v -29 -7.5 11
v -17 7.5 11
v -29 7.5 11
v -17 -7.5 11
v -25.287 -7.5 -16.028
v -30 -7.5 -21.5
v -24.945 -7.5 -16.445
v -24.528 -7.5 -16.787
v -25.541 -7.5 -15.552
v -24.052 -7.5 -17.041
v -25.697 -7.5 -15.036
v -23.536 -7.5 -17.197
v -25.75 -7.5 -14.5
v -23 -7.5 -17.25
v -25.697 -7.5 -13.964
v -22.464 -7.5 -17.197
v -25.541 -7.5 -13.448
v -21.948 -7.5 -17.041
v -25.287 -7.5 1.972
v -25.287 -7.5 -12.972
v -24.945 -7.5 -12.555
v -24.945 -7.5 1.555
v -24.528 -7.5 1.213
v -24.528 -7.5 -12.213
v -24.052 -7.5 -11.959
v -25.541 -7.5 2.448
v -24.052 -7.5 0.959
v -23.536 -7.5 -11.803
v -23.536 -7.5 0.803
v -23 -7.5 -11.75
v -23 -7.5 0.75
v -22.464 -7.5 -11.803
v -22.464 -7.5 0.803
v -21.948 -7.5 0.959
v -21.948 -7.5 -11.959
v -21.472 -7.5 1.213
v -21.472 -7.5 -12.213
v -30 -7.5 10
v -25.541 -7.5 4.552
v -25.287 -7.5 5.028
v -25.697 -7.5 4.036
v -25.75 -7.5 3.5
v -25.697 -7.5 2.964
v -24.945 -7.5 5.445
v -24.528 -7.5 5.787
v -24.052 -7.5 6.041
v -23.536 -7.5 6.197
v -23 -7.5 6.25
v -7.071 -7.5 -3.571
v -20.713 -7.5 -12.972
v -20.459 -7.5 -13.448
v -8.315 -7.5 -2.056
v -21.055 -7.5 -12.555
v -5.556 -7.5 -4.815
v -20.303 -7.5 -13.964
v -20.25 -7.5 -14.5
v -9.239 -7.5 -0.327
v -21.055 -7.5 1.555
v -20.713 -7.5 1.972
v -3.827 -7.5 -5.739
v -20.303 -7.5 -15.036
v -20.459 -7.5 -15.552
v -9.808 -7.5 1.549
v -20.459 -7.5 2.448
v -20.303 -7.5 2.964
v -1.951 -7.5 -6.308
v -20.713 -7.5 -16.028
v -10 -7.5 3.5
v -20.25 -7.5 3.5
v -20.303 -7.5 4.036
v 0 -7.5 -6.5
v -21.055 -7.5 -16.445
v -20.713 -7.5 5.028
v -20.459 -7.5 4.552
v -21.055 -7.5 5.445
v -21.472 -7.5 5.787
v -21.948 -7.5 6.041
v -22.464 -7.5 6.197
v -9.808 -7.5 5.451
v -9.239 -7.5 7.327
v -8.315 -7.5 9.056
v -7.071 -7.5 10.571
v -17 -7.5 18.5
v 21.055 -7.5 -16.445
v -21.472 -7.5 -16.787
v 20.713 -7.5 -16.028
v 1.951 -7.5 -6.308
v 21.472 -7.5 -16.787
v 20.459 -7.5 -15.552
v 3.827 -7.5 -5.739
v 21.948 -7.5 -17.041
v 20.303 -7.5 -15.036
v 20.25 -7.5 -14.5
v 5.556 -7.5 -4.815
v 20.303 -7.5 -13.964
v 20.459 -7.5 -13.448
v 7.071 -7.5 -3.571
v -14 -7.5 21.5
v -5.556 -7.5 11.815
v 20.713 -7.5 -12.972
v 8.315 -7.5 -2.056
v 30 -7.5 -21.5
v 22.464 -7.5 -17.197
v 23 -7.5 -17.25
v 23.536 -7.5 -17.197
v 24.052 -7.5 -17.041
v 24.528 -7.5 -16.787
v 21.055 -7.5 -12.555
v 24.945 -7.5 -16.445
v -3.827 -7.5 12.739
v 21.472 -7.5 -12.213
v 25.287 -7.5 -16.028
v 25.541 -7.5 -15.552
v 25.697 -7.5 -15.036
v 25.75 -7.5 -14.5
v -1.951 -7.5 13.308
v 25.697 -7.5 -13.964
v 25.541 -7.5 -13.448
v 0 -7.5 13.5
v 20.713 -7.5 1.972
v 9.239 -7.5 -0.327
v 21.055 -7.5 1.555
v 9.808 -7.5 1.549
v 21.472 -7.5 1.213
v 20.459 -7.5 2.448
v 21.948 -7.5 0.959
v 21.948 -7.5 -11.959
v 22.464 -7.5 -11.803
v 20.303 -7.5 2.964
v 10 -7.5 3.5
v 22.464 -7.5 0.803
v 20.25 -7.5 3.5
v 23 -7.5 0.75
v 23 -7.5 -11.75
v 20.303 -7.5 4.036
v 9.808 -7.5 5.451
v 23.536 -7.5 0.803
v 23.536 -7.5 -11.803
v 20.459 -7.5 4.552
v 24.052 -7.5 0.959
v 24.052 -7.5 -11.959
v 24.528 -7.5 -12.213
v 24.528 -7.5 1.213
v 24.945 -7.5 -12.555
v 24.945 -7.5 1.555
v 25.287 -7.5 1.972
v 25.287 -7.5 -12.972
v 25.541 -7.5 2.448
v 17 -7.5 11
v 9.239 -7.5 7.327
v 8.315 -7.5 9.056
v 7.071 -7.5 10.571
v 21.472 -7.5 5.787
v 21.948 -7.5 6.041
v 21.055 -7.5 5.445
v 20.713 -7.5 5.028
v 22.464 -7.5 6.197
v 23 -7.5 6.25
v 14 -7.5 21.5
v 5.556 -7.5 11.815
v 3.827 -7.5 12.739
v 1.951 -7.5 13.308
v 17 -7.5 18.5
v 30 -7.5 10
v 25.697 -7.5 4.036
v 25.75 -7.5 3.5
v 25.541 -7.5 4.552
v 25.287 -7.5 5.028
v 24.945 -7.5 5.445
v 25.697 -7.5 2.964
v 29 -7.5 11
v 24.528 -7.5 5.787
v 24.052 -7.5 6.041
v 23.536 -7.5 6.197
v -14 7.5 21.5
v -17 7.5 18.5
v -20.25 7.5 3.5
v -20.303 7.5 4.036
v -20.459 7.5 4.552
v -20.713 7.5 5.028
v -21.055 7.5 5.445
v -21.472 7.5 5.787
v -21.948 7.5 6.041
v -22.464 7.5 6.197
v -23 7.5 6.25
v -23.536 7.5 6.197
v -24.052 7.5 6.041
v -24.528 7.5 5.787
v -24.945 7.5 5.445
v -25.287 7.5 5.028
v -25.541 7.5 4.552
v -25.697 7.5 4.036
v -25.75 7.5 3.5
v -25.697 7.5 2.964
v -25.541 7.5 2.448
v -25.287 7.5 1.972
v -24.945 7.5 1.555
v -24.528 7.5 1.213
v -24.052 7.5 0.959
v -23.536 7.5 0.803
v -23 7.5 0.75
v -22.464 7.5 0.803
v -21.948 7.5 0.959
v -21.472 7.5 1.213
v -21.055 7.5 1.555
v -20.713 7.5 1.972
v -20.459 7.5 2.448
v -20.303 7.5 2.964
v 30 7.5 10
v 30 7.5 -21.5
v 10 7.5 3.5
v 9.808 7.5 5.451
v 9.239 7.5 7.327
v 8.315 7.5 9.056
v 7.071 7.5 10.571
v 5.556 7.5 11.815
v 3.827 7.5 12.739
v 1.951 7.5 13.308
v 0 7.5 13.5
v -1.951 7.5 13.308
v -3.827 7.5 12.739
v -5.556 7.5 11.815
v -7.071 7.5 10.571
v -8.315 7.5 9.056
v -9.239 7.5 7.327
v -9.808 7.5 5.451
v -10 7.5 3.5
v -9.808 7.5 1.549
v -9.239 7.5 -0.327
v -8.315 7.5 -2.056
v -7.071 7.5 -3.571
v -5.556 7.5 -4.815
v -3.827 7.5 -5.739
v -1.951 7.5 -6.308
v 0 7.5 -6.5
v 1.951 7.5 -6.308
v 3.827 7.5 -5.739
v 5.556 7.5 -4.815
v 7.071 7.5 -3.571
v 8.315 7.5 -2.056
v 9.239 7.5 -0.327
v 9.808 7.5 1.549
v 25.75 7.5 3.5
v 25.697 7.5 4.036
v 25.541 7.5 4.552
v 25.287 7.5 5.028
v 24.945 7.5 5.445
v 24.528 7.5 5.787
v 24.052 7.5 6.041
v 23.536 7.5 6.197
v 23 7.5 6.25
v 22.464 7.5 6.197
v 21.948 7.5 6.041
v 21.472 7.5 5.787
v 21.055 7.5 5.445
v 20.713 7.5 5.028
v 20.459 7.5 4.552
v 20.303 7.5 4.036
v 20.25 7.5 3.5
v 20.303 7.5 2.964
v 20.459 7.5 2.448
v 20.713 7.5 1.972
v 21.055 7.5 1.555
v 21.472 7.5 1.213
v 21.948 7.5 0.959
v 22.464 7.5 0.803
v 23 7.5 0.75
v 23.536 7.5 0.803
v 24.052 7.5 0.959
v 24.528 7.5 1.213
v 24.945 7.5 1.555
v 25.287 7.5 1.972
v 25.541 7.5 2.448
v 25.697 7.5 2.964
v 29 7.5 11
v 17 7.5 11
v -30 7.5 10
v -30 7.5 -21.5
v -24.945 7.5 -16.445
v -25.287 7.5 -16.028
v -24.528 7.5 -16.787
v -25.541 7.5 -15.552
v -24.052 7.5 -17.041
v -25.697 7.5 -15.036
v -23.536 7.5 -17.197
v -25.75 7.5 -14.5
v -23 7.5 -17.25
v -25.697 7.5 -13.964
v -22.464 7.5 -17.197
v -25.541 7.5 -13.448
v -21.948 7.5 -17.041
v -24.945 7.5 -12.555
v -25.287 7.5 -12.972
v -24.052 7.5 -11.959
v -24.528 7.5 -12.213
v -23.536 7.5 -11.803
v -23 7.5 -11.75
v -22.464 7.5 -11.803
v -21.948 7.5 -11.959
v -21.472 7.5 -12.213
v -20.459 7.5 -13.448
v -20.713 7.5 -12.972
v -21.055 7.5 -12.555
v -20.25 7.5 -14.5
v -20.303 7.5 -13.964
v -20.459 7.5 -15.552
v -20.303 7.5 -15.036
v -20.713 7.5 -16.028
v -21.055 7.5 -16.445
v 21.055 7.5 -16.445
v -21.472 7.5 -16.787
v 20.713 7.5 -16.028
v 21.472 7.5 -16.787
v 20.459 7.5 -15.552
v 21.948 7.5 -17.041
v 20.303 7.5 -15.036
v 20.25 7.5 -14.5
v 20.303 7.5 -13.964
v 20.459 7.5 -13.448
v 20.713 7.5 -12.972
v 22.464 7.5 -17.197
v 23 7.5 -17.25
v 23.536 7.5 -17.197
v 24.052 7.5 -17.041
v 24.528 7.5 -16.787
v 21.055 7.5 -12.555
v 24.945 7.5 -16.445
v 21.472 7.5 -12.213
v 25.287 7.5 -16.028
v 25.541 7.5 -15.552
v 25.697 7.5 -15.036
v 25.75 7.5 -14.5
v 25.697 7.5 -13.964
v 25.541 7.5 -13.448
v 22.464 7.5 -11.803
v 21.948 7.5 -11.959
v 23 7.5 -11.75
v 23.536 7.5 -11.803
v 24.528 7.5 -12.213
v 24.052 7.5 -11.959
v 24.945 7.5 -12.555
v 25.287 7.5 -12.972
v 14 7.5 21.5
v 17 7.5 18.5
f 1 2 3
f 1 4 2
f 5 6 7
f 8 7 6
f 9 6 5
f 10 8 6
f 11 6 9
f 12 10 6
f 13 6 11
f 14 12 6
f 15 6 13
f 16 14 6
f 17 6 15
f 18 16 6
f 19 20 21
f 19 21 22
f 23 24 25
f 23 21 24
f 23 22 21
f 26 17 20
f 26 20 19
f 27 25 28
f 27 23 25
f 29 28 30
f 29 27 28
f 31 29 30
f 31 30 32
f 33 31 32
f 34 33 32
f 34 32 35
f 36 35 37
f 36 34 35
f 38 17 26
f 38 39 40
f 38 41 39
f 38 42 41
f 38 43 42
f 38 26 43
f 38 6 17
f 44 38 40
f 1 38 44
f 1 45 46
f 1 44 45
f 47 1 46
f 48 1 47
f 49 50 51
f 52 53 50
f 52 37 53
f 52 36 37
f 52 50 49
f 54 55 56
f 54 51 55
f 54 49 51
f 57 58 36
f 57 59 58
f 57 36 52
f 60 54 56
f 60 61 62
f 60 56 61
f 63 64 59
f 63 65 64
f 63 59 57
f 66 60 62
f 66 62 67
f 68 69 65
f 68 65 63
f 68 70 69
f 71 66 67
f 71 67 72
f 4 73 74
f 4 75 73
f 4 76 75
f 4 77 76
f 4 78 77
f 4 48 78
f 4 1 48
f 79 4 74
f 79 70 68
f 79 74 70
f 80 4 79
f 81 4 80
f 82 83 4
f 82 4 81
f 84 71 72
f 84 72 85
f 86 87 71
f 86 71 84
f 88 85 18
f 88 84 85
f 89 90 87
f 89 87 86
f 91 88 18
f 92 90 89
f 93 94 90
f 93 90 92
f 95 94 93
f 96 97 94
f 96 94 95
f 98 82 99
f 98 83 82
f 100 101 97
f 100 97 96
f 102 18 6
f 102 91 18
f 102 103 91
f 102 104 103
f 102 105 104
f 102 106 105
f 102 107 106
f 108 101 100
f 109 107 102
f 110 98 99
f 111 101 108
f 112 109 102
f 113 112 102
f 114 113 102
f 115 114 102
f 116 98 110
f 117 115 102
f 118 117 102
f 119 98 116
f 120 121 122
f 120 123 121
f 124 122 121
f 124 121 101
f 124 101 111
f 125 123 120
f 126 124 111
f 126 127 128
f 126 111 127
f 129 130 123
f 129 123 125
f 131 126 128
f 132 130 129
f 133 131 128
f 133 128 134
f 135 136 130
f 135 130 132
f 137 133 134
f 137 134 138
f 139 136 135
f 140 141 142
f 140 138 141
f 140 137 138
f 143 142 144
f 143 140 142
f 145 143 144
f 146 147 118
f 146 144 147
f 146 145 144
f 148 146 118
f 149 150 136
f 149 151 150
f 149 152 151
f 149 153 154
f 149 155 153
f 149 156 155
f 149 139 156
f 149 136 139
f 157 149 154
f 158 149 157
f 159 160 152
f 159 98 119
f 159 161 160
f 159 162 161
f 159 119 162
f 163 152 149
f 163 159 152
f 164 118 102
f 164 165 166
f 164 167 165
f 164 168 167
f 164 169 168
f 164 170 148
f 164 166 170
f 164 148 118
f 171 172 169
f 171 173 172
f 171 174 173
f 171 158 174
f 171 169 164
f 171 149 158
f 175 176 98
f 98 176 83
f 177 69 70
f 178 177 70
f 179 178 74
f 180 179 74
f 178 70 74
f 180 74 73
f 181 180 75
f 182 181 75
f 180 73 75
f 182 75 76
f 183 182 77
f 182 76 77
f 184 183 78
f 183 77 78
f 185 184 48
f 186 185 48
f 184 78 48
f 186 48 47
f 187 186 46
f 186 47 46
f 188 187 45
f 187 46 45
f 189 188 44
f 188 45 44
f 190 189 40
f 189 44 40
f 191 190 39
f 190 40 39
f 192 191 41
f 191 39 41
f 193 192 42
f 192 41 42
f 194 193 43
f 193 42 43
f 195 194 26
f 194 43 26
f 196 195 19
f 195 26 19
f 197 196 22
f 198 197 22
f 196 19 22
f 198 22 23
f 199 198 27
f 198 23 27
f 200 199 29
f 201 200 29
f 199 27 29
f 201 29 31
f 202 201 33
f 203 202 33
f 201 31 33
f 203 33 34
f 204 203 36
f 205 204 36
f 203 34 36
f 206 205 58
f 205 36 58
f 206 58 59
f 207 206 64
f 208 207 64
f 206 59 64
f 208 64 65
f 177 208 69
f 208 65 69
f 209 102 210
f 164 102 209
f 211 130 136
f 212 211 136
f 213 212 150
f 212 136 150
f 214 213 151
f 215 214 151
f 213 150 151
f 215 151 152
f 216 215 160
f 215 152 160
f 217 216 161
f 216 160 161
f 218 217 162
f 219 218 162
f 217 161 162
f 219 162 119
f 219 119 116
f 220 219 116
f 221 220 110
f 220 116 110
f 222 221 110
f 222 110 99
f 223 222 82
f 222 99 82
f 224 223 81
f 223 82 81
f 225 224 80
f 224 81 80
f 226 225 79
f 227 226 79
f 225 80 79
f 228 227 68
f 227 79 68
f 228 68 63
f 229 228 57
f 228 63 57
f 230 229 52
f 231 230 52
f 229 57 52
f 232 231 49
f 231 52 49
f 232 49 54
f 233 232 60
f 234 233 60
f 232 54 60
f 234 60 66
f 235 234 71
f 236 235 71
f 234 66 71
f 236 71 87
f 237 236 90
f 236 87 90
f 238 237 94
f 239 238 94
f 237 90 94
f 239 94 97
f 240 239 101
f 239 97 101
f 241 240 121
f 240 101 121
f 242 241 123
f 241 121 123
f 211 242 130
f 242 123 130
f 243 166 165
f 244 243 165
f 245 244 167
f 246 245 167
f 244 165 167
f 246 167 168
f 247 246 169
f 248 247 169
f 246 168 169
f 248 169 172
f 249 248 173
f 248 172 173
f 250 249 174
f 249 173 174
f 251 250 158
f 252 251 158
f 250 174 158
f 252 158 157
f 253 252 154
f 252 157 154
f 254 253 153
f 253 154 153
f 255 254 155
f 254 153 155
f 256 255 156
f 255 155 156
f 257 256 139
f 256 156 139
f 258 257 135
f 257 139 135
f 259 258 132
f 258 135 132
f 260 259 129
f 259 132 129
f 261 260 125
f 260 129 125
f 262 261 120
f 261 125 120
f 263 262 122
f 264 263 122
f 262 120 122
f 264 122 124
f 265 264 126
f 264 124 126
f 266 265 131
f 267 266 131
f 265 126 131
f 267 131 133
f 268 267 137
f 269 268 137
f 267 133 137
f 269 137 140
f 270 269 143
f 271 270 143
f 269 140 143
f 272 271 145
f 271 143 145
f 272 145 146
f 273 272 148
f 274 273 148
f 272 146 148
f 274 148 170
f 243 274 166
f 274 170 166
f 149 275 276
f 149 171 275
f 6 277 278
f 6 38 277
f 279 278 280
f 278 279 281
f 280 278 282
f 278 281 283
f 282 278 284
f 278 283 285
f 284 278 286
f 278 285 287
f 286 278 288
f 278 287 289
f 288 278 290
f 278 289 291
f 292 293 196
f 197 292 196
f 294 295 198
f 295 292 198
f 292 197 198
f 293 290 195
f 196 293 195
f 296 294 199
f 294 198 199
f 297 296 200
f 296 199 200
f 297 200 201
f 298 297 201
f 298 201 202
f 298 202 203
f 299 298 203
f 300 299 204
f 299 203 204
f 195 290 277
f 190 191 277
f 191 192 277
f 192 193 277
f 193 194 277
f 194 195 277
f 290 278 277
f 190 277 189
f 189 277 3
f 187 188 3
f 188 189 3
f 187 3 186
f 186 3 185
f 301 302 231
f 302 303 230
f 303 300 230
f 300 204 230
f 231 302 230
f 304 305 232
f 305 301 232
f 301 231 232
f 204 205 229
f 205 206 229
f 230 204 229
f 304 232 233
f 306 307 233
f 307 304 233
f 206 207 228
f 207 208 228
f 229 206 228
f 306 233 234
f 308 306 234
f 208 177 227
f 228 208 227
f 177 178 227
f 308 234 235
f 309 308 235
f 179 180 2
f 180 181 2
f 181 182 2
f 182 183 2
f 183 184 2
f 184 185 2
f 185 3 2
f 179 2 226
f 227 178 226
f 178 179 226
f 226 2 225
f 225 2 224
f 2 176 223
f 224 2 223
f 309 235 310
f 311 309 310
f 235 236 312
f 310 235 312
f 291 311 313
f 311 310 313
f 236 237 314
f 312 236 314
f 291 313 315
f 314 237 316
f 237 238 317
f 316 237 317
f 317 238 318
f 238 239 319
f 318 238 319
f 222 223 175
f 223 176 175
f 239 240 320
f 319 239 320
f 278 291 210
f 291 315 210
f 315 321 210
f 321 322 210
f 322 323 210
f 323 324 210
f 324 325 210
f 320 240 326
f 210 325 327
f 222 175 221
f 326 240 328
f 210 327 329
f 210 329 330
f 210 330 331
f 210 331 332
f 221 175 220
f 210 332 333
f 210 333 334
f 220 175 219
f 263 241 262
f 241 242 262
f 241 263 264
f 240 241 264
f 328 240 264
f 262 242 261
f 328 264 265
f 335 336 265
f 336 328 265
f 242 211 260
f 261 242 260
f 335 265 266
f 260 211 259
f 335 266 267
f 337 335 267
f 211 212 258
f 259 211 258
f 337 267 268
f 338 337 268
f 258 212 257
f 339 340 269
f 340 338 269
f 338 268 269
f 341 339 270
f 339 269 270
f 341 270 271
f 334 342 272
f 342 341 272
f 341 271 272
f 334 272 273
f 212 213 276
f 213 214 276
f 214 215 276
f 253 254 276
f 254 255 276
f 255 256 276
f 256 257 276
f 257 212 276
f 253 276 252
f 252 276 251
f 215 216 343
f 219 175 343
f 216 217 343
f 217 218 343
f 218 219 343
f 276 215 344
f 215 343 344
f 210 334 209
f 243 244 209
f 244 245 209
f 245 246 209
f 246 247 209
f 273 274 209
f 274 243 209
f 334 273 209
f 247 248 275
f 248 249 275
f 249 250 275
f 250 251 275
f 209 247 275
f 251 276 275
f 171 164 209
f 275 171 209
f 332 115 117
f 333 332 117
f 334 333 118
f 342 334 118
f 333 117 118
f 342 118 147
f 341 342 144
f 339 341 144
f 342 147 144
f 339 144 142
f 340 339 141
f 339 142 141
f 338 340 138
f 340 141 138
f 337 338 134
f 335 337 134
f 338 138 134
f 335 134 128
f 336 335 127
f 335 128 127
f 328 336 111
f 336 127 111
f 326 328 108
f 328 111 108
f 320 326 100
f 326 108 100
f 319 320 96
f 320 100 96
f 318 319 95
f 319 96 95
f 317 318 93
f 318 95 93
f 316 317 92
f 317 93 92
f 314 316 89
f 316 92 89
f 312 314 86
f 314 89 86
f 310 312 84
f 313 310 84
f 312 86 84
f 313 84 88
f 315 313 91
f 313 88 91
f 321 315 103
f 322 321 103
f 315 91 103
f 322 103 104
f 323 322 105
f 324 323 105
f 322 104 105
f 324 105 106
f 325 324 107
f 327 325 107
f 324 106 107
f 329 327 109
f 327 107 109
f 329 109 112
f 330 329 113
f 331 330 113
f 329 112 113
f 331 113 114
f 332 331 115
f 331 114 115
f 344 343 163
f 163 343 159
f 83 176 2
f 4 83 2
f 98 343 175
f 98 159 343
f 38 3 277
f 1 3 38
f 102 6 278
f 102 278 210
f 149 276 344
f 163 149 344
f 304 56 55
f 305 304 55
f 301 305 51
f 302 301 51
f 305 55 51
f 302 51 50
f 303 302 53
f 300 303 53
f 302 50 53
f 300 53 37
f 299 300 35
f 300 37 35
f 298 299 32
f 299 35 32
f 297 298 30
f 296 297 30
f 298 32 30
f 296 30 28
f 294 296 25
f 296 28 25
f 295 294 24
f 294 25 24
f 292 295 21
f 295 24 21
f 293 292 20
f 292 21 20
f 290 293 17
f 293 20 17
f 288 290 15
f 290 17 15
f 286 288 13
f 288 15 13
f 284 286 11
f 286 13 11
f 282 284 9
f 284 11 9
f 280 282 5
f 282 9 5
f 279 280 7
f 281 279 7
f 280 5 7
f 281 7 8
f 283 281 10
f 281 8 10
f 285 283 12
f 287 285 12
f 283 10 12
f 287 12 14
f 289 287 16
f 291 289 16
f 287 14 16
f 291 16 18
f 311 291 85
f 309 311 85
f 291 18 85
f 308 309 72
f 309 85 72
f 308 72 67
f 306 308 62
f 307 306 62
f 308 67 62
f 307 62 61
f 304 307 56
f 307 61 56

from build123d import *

# Parameters (mm, degrees)
F1_DEPTH = 7.5
F2_R     = 10
F2_R_2   = 2.75
F3_DEPTH = 15
F4_SIZE  = 3
F5_SIZE  = 1


with BuildPart() as f1:
    # F0 (on Front) → F1 (new body, symmetric)
    with BuildSketch(Plane.XZ):
        Polygon((17, 11), (17, 21.5), (-17, 21.5), (-17, 11), (-30, 11), (-30, -21.5), (30, -21.5), (30, 11), align=None)
    extrude(amount=F1_DEPTH, both=True)

    # F2 (on face) → F3 (cut)
    with BuildSketch(Plane.XZ.offset(7.5)):
        with Locations((0, 3.5)):
            Circle(F2_R)
        with Locations((-23, 3.5)):
            Circle(F2_R_2)
        with Locations((23, 3.5)):
            Circle(F2_R_2)
        with Locations((-23, -14.5)):
            Circle(F2_R_2)
        with Locations((23, -14.5)):
            Circle(F2_R_2)
    extrude(amount=-F3_DEPTH, mode=Mode.SUBTRACT)

    # F4
    f4_edges = [f1.edges().sort_by_distance(p)[0] for p in [
        (17, 0, 21.5),
        (-17, 0, 21.5),
    ]]
    chamfer(f4_edges, length=F4_SIZE)

    # F5
    f5_edges = [f1.edges().sort_by_distance(p)[0] for p in [
        (-30, 0, 11),
        (30, 0, 11),
    ]]
    chamfer(f5_edges, length=F5_SIZE)


solid = f1.part
